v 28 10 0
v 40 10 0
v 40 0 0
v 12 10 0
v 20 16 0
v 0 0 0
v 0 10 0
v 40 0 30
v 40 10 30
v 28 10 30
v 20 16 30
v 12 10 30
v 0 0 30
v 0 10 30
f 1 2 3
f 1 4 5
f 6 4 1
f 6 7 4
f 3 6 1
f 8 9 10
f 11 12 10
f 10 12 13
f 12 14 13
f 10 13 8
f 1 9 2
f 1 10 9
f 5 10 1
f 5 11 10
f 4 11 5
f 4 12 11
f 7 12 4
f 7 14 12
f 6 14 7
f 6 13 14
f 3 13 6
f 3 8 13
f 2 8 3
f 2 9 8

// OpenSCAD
$fn = 32;

// ----------------------------------------------------------------------
// V guide rail: vrib, 40 mm wide
// ----------------------------------------------------------------------

// --- parameters (mm) ---
rail_w = 40;              // rail width, X
base_t = 10;              // base plate thickness
v_depth = 6;              // V feature depth / height
v_half_w = 8;             // half width of the V at the base face
plate_t = 30;             // rail length, Z (the extrusion height)

profile = [[0, 0], [40, 0], [40, 10], [28, 10], [20, 16], [12, 10], [0, 10]];  // primary outline, 7 points, counter clockwise

// --- the one profile operation ---
linear_extrude(height = plate_t) polygon(points = profile);
